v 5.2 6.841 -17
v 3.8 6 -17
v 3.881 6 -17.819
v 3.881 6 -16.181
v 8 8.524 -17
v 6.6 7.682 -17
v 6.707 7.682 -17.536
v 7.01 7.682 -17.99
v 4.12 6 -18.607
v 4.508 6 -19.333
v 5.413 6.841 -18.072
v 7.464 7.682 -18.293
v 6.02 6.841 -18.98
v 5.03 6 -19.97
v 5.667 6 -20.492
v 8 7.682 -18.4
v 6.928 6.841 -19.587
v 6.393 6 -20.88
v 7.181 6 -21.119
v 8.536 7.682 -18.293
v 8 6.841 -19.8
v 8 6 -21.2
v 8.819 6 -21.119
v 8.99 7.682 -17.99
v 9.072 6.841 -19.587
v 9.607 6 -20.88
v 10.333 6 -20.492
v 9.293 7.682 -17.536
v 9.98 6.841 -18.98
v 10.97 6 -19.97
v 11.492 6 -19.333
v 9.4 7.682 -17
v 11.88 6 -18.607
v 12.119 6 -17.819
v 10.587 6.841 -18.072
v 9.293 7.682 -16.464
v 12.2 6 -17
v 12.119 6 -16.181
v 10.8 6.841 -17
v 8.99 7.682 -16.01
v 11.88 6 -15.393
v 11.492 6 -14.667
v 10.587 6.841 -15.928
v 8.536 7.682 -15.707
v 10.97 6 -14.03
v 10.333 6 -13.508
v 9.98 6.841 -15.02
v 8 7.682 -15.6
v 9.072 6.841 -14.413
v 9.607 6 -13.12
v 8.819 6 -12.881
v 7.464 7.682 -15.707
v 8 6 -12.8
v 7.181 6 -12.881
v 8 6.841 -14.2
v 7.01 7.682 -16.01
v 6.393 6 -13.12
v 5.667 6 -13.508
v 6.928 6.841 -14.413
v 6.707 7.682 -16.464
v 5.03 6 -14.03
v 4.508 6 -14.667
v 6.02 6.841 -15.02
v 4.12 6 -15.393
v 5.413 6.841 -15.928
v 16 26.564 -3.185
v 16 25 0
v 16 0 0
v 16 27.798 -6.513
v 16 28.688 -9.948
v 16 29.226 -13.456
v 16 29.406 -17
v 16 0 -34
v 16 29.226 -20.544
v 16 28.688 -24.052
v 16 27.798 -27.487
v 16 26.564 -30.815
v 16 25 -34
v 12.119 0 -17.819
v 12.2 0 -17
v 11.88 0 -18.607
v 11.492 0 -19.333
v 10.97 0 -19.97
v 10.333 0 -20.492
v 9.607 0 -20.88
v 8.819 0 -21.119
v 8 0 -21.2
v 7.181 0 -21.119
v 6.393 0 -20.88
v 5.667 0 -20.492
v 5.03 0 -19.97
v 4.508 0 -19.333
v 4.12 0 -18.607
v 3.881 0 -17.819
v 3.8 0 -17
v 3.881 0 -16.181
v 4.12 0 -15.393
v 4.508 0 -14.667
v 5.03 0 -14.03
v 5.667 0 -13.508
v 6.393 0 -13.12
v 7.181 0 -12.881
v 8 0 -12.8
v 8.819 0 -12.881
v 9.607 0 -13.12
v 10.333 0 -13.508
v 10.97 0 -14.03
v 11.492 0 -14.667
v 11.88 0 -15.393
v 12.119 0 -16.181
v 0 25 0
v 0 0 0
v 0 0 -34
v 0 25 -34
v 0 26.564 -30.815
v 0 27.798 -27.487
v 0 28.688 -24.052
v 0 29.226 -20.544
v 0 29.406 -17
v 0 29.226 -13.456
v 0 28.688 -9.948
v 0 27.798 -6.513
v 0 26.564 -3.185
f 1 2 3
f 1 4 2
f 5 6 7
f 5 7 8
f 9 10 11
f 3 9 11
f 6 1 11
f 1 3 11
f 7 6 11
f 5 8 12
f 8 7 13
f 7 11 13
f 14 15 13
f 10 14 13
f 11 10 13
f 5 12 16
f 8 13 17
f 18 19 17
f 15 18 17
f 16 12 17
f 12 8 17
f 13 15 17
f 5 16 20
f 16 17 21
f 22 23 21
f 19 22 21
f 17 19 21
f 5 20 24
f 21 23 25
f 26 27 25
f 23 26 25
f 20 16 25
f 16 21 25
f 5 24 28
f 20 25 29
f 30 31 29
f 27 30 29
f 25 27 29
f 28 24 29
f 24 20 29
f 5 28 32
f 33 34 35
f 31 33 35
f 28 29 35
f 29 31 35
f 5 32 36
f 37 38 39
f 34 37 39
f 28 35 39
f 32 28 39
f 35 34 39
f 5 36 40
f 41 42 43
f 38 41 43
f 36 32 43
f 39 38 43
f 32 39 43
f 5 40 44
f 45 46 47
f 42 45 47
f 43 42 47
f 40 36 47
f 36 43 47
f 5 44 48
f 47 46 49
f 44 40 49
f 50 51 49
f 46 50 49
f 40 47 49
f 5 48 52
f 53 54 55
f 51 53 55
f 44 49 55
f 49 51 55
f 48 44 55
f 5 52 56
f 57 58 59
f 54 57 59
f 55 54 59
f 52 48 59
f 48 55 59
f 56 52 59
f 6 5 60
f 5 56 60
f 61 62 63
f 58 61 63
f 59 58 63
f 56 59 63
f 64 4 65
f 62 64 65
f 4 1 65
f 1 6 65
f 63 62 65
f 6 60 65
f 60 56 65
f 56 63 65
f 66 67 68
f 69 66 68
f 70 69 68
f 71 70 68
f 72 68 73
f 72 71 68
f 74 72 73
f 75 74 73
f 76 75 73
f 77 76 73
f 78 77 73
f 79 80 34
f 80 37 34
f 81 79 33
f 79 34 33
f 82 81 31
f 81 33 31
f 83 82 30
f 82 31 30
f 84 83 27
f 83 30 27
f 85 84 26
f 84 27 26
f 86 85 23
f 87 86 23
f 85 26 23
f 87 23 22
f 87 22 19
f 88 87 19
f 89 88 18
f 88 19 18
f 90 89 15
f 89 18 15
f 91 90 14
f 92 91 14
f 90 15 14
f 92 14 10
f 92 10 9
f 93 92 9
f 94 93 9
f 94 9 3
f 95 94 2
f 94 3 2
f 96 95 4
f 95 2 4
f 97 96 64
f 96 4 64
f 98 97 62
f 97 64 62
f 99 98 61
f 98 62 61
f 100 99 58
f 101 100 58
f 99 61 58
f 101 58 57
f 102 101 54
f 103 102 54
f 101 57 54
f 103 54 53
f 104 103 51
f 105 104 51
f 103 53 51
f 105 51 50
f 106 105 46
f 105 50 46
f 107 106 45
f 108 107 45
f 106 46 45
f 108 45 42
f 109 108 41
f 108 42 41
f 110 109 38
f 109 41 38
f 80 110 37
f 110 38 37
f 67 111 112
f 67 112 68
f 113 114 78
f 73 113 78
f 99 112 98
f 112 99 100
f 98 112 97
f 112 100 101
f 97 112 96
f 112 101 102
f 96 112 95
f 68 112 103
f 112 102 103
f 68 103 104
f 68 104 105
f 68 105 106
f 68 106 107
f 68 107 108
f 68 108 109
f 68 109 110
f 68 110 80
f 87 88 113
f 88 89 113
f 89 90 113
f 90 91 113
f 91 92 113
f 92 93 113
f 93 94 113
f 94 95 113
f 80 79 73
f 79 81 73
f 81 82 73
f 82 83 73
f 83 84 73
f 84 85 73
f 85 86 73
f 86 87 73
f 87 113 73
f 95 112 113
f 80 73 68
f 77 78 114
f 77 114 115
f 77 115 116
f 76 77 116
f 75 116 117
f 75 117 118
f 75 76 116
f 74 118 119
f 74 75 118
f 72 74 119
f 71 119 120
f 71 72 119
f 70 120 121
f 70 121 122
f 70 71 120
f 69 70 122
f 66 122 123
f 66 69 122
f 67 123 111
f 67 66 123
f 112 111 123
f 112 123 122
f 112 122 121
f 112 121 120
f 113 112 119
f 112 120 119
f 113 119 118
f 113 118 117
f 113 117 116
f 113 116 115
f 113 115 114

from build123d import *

# Parameters (mm, degrees)
SKETCH1_W                = 16
SKETCH1_H                = 34
BOSS_EXTRUDE1_DEPTH      = 25
BOSS_EXTRUDE2_DEPTH      = 16
M8_CLEARANCE_HOLE1_D     = 8.4
M8_CLEARANCE_HOLE1_DEPTH = 6
M8_CLEARANCE_HOLE1_TIP   = 2.5236146


with BuildPart() as part:
    # Sketch1 → Boss-Extrude1 (new body)
    with BuildSketch(Plane(origin=(0, 0, 0), x_dir=(1, 0, 0), z_dir=(0, 1, 0))):
        with Locations((8, 17)):
            Rectangle(SKETCH1_W, SKETCH1_H)
    extrude(amount=BOSS_EXTRUDE1_DEPTH)

    # Sketch2 → Boss-Extrude2 (add)
    with BuildSketch(Plane(origin=(16, 0, 0), x_dir=(0, 0, -1), z_dir=(1, 0, 0))):
        with BuildLine():
            Line((0, 25), (34, 25))
            ThreePointArc((34, 25), (17, 29.405882918), (0, 25))
        make_face()
    extrude(amount=-BOSS_EXTRUDE2_DEPTH)

    # M8 Clearance Hole1
    with Locations(Plane(origin=(0, 0, 0), x_dir=(-1, 0, 0), z_dir=(0, -1, 0))):
        with Locations((-8, 17)):
            Hole(M8_CLEARANCE_HOLE1_D / 2, depth=M8_CLEARANCE_HOLE1_DEPTH)
            with Locations((0, 0, -(M8_CLEARANCE_HOLE1_DEPTH + M8_CLEARANCE_HOLE1_TIP / 2))):  # 118° drill point
                Cone(0, M8_CLEARANCE_HOLE1_D / 2, M8_CLEARANCE_HOLE1_TIP, mode=Mode.SUBTRACT)


solid = part.part
